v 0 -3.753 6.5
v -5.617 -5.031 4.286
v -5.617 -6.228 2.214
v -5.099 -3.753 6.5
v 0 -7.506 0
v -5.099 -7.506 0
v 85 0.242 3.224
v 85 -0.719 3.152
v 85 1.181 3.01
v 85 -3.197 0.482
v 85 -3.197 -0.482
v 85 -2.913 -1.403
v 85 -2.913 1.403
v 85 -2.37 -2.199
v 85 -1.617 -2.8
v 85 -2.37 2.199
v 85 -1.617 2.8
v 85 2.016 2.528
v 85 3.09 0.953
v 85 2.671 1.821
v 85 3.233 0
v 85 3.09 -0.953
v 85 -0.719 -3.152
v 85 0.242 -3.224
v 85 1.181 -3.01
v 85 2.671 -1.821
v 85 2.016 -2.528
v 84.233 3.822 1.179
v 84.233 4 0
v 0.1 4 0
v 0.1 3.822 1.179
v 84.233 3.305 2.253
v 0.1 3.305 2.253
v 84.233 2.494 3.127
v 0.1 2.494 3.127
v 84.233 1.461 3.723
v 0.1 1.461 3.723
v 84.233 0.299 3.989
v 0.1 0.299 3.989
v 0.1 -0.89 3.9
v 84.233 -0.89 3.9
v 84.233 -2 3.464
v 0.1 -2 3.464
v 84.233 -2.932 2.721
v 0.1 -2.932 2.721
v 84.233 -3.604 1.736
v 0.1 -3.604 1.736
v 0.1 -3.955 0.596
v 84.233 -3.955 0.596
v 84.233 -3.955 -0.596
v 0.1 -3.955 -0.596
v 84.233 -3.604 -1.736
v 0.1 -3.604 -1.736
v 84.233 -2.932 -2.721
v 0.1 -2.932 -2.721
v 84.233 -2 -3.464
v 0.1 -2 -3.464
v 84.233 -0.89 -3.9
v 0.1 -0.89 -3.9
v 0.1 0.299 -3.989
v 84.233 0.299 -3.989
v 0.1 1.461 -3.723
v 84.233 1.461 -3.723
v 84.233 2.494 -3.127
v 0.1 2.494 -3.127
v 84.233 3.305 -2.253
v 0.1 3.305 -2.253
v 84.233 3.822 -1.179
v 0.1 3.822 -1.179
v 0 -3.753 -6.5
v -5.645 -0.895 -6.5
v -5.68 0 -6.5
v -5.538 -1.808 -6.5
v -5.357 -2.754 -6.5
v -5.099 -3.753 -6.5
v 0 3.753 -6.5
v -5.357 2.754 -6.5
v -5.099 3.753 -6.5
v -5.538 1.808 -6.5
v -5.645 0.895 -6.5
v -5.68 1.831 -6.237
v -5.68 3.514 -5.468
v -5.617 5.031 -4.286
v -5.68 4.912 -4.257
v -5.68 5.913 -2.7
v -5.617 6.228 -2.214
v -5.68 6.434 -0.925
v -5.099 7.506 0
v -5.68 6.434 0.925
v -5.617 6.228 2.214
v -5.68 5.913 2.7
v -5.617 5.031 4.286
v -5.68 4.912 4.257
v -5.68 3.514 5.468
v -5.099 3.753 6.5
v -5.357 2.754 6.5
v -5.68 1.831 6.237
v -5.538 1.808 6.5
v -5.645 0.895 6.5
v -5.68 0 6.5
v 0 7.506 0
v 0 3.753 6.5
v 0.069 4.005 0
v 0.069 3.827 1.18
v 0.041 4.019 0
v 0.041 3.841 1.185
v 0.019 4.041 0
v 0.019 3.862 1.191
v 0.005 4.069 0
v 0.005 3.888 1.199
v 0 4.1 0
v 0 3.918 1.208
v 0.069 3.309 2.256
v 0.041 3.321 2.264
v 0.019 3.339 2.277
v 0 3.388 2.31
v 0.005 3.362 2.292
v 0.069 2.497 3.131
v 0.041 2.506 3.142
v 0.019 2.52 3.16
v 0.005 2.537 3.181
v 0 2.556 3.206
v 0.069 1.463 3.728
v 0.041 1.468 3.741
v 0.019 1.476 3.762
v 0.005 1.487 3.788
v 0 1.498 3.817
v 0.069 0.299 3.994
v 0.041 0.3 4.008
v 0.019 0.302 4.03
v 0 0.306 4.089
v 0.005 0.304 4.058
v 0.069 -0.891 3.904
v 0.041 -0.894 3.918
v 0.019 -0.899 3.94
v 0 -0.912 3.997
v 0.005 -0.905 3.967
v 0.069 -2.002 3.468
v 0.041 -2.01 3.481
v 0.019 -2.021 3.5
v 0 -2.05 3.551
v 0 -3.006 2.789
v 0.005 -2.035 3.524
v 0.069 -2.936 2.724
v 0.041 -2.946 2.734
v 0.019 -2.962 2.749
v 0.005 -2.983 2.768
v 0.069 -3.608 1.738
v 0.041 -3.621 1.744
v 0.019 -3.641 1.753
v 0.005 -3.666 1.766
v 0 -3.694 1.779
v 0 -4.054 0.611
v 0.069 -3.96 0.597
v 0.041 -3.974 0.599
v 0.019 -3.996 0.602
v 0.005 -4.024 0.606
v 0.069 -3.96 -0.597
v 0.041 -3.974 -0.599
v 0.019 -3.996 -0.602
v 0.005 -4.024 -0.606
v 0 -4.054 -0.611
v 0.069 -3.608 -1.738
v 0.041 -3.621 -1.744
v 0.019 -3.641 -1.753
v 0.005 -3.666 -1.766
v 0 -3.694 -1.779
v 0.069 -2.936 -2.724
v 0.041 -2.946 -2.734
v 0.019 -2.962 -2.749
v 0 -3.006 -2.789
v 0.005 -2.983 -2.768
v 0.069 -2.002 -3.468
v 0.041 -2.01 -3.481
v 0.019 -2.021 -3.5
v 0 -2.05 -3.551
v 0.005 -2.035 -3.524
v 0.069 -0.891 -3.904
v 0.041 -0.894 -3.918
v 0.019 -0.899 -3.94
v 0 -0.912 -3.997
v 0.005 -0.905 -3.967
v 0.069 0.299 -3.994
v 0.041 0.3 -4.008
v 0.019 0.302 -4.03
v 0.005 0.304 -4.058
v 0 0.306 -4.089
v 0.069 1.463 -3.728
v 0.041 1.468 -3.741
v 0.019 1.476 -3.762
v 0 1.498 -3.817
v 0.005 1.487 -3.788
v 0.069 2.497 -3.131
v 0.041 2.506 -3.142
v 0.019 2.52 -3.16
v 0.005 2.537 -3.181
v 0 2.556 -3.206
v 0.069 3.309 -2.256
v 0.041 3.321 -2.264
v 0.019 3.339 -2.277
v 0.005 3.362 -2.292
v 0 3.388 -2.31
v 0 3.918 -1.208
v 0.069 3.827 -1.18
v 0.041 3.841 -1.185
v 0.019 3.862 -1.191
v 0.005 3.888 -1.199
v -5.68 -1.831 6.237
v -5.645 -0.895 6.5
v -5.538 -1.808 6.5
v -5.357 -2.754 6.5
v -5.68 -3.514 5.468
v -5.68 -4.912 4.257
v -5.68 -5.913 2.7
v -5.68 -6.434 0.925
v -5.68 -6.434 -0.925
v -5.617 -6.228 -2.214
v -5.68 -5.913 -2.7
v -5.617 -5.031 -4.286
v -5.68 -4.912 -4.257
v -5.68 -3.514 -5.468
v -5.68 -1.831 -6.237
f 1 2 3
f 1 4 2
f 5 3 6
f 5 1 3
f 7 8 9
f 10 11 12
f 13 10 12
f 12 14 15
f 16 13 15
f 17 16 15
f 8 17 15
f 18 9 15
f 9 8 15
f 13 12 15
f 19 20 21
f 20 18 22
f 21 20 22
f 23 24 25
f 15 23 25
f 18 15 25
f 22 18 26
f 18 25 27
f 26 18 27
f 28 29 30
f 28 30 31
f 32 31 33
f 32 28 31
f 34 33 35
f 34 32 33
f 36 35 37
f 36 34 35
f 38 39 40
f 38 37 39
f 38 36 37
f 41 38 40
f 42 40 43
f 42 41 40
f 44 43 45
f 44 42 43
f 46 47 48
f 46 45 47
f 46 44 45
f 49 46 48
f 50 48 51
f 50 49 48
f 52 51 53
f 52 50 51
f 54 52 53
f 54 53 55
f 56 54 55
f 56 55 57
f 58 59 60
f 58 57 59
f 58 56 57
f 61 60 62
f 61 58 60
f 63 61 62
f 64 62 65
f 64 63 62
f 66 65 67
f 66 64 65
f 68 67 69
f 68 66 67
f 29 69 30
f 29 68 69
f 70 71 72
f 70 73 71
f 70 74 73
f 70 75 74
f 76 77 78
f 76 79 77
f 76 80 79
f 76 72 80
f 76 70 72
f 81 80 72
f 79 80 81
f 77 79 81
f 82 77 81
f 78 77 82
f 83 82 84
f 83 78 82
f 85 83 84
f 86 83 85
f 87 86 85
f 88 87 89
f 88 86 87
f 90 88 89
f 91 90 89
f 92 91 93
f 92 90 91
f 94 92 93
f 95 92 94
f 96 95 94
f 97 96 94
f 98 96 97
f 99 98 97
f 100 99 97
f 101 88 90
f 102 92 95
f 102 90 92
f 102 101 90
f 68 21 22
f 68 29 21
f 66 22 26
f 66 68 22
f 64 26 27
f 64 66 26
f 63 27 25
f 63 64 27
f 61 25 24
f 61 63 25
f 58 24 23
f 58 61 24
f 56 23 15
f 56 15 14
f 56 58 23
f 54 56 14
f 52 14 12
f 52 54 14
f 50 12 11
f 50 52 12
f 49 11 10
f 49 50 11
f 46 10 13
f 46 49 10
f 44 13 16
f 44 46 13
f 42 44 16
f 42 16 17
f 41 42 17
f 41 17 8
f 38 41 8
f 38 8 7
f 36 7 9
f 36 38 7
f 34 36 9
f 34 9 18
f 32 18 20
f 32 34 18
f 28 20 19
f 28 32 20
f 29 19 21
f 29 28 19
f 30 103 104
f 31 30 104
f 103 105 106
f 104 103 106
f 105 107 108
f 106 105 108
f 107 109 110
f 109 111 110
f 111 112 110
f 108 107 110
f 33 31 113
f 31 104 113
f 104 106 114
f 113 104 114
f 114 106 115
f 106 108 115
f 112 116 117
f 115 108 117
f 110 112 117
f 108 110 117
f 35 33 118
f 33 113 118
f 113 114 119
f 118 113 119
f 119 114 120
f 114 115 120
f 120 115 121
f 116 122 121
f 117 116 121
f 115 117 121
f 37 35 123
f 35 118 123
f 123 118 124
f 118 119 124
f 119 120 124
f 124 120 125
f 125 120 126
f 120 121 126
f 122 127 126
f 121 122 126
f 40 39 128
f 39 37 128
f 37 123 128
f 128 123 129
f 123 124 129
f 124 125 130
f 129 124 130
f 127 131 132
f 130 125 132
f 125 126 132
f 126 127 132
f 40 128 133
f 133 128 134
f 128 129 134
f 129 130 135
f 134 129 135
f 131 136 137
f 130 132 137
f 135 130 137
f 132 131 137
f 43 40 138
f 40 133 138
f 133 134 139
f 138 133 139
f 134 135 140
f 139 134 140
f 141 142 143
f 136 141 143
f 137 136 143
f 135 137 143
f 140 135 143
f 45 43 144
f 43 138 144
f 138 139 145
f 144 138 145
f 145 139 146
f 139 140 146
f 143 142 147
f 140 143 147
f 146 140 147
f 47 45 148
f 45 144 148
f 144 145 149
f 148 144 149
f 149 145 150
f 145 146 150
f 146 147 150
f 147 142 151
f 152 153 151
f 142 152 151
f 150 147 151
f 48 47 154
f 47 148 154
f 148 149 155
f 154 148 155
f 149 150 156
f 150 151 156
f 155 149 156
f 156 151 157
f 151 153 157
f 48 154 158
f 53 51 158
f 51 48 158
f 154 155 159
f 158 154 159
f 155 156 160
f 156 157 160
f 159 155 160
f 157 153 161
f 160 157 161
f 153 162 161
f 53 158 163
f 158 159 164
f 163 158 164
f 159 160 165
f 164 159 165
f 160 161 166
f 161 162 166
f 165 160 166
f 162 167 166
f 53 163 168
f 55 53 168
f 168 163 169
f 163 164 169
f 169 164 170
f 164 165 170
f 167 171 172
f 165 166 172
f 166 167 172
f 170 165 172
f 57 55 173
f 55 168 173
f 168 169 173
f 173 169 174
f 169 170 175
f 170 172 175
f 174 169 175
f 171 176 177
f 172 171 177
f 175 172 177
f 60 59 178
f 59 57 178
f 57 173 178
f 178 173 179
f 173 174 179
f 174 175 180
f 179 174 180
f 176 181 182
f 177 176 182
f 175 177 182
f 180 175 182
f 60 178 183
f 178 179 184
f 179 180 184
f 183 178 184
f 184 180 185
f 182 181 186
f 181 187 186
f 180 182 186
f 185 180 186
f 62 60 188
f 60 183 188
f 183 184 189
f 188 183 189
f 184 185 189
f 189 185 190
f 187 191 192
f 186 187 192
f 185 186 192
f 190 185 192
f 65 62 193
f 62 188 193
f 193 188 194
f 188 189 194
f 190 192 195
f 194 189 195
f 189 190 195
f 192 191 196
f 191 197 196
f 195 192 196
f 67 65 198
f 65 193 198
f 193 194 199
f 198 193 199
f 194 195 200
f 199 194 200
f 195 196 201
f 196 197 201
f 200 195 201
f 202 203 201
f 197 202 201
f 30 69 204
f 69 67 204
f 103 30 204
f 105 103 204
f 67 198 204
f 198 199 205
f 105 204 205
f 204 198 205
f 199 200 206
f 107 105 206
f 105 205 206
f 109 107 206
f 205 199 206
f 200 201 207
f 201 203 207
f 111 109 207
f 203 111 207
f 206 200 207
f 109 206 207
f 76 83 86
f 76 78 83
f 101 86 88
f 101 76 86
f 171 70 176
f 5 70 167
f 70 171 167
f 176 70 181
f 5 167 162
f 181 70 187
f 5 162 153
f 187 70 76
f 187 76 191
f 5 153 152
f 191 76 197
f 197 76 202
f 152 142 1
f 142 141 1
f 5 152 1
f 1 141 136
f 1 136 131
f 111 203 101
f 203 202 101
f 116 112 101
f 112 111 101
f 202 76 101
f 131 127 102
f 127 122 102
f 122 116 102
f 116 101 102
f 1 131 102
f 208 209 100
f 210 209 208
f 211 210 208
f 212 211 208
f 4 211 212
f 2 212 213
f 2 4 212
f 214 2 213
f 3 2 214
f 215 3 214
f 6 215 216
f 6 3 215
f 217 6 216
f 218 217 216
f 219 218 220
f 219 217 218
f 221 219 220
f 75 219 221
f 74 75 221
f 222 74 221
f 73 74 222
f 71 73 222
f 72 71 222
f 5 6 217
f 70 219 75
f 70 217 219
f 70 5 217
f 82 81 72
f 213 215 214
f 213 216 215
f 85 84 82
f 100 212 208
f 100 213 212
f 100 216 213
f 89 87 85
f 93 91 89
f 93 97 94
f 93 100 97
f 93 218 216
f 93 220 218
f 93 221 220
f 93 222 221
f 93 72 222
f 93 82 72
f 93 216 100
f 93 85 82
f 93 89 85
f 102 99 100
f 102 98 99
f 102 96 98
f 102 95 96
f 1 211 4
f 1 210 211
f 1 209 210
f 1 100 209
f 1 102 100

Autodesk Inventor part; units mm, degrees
ref_plane "YZ Plane" through (0, 0, 0) normal (1, 0, 0) x (0, 1, 0)
ref_plane "XZ Plane" through (0, 0, 0) normal (0, 1, 0) x (-1, 0, 0)
sketch "Sketch1" plane through (0, 0, 0) normal (0, 0, 1) x (1, 0, 0)
  line L0 (0, 4) -> (85, 4)
  line L1 (85, 4) -> (85, 0)
  line L2 (85, 0) -> (0, 0)
  line L3 (-14, 0) -> (84, 0) projected
  line L4 (0, -0.8) -> (0, 4.8) projected
  line L5 (0, 4) -> (0, 0)
  dimension "d2" = 8
  dimension "d59" = 85
revolve "Body" add sketch "Sketch1" angle 360 about axis through (85, 0, 0) along (-1, 0, 0)
sketch "Sketch2" plane through (0, 0, 0) normal (-1, 0, 0) x (0, 0, 1)
  line L0 (0, 7.5056) -> (6.5, 3.7528)
  line L1 (6.5, 3.7528) -> (6.5, -3.7528)
  line L2 (6.5, -3.7528) -> (0, -7.5056)
  line L3 (0, -7.5056) -> (-6.5, -3.7528)
  line L4 (-6.5, -3.7528) -> (-6.5, 3.7528)
  line L5 (-6.5, 3.7528) -> (0, 7.5056)
  line L6 (-9.1, 0) -> (9.1, 0) projected
  line L7 (0, 10.5078) -> (0, -10.5078) projected
  point P0 (0, 0)
  point P1 (0, 0)
  dimension "d11" = 13
extrude "Head" add sketch "Sketch2" along normal blind 5.68
sketch "Sketch4" plane through (0, 0, 0) normal (0, 0, 1) x (1, 0, 0)
  line L0 (-4.9294, 7.8) -> (-5.68, 6.5)
  line L1 (-1.1, 0) -> (-0.234, 0)
  line L2 (-6.7692, 0) -> (0.8552, 0) projected
  line L3 (-5.68, 7.8) -> (-4.9294, 7.8)
  line L4 (-5.68, 6.5) -> (-5.68, 7.8)
  line L5 (0, 9.36) -> (0, -1.56) projected
  dimension "d65" = 13
  dimension "d67" = 30
  dimension "d68" = 15.6
  dimension "d69" = 5.68
revolve "Chamfer1" cut sketch "Sketch4" angle 360 about axis through (-1.1, 0, 0) along (1, 0, 0)
thread "Thread" size "M8x1.25" class "6g" standard "ISO Metric profile" length 22
chamfer "Chamfer2" distance 0.7668 distance2 0.7669 1 edges at (85, -4, 0) measured on face at (85, -0.4728, -1.2467)
fillet "Fillet" radius 0.1 1 edges at (0, -4, 0)
ref_plane "Work Plane1" through (1.525, 0, 0) normal (0, 0, 1) x (1, 0, 0)
equation "\"d2\" = GD"
equation "\"d59\" = NLG"
equation "\"d11\" = SW"
equation "\"d3\" = KOH"
equation "\"d15\" = GEL"
equation "\"d6\" = -0.5 * SPD + 0.5 * GD"
equation "\"d71\" = RR"
equation "\"d65\" = SW"
equation "\"d67\" = ANG1"
equation "\"d68\" = 1.2 * SW"
equation "\"d69\" = KOH"
equation "\"NLG\" = 85"
equation "\"GD\" = NND"
equation "\"BDM\" = NND"
equation "\"KOH\" = 5.68"
equation "\"GEL\" = 22"
equation "\"SW\" = 13"
equation "\"SW0\" = SW"
equation "\"SPD\" = NND - 1.2269 * PTC"
equation "\"SD2\" = NND"
equation "\"SD\" = 0"
equation "\"ANG1\" = 30deg"
equation "\"GAL\" = 0.61345 * PTC"
equation "\"GUL\" = 0.61345 * PTC"
equation "\"RR\" = 0.1"
equation "\"RR1\" = 0.4"
equation "\"GD1\" = THREADDIA - 1.2269 * PTC"
equation "\"THREADDIA\" = 8"
equation "\"TOA\" = 30deg"
equation "\"PTC\" = 1.25"
equation "\"KOH1\" = 3.7"
equation "\"NND\" = 8"
equation "\"E0\" = 1.155 * SW"
properties part number "M8x85" material "Steel, Mild"
